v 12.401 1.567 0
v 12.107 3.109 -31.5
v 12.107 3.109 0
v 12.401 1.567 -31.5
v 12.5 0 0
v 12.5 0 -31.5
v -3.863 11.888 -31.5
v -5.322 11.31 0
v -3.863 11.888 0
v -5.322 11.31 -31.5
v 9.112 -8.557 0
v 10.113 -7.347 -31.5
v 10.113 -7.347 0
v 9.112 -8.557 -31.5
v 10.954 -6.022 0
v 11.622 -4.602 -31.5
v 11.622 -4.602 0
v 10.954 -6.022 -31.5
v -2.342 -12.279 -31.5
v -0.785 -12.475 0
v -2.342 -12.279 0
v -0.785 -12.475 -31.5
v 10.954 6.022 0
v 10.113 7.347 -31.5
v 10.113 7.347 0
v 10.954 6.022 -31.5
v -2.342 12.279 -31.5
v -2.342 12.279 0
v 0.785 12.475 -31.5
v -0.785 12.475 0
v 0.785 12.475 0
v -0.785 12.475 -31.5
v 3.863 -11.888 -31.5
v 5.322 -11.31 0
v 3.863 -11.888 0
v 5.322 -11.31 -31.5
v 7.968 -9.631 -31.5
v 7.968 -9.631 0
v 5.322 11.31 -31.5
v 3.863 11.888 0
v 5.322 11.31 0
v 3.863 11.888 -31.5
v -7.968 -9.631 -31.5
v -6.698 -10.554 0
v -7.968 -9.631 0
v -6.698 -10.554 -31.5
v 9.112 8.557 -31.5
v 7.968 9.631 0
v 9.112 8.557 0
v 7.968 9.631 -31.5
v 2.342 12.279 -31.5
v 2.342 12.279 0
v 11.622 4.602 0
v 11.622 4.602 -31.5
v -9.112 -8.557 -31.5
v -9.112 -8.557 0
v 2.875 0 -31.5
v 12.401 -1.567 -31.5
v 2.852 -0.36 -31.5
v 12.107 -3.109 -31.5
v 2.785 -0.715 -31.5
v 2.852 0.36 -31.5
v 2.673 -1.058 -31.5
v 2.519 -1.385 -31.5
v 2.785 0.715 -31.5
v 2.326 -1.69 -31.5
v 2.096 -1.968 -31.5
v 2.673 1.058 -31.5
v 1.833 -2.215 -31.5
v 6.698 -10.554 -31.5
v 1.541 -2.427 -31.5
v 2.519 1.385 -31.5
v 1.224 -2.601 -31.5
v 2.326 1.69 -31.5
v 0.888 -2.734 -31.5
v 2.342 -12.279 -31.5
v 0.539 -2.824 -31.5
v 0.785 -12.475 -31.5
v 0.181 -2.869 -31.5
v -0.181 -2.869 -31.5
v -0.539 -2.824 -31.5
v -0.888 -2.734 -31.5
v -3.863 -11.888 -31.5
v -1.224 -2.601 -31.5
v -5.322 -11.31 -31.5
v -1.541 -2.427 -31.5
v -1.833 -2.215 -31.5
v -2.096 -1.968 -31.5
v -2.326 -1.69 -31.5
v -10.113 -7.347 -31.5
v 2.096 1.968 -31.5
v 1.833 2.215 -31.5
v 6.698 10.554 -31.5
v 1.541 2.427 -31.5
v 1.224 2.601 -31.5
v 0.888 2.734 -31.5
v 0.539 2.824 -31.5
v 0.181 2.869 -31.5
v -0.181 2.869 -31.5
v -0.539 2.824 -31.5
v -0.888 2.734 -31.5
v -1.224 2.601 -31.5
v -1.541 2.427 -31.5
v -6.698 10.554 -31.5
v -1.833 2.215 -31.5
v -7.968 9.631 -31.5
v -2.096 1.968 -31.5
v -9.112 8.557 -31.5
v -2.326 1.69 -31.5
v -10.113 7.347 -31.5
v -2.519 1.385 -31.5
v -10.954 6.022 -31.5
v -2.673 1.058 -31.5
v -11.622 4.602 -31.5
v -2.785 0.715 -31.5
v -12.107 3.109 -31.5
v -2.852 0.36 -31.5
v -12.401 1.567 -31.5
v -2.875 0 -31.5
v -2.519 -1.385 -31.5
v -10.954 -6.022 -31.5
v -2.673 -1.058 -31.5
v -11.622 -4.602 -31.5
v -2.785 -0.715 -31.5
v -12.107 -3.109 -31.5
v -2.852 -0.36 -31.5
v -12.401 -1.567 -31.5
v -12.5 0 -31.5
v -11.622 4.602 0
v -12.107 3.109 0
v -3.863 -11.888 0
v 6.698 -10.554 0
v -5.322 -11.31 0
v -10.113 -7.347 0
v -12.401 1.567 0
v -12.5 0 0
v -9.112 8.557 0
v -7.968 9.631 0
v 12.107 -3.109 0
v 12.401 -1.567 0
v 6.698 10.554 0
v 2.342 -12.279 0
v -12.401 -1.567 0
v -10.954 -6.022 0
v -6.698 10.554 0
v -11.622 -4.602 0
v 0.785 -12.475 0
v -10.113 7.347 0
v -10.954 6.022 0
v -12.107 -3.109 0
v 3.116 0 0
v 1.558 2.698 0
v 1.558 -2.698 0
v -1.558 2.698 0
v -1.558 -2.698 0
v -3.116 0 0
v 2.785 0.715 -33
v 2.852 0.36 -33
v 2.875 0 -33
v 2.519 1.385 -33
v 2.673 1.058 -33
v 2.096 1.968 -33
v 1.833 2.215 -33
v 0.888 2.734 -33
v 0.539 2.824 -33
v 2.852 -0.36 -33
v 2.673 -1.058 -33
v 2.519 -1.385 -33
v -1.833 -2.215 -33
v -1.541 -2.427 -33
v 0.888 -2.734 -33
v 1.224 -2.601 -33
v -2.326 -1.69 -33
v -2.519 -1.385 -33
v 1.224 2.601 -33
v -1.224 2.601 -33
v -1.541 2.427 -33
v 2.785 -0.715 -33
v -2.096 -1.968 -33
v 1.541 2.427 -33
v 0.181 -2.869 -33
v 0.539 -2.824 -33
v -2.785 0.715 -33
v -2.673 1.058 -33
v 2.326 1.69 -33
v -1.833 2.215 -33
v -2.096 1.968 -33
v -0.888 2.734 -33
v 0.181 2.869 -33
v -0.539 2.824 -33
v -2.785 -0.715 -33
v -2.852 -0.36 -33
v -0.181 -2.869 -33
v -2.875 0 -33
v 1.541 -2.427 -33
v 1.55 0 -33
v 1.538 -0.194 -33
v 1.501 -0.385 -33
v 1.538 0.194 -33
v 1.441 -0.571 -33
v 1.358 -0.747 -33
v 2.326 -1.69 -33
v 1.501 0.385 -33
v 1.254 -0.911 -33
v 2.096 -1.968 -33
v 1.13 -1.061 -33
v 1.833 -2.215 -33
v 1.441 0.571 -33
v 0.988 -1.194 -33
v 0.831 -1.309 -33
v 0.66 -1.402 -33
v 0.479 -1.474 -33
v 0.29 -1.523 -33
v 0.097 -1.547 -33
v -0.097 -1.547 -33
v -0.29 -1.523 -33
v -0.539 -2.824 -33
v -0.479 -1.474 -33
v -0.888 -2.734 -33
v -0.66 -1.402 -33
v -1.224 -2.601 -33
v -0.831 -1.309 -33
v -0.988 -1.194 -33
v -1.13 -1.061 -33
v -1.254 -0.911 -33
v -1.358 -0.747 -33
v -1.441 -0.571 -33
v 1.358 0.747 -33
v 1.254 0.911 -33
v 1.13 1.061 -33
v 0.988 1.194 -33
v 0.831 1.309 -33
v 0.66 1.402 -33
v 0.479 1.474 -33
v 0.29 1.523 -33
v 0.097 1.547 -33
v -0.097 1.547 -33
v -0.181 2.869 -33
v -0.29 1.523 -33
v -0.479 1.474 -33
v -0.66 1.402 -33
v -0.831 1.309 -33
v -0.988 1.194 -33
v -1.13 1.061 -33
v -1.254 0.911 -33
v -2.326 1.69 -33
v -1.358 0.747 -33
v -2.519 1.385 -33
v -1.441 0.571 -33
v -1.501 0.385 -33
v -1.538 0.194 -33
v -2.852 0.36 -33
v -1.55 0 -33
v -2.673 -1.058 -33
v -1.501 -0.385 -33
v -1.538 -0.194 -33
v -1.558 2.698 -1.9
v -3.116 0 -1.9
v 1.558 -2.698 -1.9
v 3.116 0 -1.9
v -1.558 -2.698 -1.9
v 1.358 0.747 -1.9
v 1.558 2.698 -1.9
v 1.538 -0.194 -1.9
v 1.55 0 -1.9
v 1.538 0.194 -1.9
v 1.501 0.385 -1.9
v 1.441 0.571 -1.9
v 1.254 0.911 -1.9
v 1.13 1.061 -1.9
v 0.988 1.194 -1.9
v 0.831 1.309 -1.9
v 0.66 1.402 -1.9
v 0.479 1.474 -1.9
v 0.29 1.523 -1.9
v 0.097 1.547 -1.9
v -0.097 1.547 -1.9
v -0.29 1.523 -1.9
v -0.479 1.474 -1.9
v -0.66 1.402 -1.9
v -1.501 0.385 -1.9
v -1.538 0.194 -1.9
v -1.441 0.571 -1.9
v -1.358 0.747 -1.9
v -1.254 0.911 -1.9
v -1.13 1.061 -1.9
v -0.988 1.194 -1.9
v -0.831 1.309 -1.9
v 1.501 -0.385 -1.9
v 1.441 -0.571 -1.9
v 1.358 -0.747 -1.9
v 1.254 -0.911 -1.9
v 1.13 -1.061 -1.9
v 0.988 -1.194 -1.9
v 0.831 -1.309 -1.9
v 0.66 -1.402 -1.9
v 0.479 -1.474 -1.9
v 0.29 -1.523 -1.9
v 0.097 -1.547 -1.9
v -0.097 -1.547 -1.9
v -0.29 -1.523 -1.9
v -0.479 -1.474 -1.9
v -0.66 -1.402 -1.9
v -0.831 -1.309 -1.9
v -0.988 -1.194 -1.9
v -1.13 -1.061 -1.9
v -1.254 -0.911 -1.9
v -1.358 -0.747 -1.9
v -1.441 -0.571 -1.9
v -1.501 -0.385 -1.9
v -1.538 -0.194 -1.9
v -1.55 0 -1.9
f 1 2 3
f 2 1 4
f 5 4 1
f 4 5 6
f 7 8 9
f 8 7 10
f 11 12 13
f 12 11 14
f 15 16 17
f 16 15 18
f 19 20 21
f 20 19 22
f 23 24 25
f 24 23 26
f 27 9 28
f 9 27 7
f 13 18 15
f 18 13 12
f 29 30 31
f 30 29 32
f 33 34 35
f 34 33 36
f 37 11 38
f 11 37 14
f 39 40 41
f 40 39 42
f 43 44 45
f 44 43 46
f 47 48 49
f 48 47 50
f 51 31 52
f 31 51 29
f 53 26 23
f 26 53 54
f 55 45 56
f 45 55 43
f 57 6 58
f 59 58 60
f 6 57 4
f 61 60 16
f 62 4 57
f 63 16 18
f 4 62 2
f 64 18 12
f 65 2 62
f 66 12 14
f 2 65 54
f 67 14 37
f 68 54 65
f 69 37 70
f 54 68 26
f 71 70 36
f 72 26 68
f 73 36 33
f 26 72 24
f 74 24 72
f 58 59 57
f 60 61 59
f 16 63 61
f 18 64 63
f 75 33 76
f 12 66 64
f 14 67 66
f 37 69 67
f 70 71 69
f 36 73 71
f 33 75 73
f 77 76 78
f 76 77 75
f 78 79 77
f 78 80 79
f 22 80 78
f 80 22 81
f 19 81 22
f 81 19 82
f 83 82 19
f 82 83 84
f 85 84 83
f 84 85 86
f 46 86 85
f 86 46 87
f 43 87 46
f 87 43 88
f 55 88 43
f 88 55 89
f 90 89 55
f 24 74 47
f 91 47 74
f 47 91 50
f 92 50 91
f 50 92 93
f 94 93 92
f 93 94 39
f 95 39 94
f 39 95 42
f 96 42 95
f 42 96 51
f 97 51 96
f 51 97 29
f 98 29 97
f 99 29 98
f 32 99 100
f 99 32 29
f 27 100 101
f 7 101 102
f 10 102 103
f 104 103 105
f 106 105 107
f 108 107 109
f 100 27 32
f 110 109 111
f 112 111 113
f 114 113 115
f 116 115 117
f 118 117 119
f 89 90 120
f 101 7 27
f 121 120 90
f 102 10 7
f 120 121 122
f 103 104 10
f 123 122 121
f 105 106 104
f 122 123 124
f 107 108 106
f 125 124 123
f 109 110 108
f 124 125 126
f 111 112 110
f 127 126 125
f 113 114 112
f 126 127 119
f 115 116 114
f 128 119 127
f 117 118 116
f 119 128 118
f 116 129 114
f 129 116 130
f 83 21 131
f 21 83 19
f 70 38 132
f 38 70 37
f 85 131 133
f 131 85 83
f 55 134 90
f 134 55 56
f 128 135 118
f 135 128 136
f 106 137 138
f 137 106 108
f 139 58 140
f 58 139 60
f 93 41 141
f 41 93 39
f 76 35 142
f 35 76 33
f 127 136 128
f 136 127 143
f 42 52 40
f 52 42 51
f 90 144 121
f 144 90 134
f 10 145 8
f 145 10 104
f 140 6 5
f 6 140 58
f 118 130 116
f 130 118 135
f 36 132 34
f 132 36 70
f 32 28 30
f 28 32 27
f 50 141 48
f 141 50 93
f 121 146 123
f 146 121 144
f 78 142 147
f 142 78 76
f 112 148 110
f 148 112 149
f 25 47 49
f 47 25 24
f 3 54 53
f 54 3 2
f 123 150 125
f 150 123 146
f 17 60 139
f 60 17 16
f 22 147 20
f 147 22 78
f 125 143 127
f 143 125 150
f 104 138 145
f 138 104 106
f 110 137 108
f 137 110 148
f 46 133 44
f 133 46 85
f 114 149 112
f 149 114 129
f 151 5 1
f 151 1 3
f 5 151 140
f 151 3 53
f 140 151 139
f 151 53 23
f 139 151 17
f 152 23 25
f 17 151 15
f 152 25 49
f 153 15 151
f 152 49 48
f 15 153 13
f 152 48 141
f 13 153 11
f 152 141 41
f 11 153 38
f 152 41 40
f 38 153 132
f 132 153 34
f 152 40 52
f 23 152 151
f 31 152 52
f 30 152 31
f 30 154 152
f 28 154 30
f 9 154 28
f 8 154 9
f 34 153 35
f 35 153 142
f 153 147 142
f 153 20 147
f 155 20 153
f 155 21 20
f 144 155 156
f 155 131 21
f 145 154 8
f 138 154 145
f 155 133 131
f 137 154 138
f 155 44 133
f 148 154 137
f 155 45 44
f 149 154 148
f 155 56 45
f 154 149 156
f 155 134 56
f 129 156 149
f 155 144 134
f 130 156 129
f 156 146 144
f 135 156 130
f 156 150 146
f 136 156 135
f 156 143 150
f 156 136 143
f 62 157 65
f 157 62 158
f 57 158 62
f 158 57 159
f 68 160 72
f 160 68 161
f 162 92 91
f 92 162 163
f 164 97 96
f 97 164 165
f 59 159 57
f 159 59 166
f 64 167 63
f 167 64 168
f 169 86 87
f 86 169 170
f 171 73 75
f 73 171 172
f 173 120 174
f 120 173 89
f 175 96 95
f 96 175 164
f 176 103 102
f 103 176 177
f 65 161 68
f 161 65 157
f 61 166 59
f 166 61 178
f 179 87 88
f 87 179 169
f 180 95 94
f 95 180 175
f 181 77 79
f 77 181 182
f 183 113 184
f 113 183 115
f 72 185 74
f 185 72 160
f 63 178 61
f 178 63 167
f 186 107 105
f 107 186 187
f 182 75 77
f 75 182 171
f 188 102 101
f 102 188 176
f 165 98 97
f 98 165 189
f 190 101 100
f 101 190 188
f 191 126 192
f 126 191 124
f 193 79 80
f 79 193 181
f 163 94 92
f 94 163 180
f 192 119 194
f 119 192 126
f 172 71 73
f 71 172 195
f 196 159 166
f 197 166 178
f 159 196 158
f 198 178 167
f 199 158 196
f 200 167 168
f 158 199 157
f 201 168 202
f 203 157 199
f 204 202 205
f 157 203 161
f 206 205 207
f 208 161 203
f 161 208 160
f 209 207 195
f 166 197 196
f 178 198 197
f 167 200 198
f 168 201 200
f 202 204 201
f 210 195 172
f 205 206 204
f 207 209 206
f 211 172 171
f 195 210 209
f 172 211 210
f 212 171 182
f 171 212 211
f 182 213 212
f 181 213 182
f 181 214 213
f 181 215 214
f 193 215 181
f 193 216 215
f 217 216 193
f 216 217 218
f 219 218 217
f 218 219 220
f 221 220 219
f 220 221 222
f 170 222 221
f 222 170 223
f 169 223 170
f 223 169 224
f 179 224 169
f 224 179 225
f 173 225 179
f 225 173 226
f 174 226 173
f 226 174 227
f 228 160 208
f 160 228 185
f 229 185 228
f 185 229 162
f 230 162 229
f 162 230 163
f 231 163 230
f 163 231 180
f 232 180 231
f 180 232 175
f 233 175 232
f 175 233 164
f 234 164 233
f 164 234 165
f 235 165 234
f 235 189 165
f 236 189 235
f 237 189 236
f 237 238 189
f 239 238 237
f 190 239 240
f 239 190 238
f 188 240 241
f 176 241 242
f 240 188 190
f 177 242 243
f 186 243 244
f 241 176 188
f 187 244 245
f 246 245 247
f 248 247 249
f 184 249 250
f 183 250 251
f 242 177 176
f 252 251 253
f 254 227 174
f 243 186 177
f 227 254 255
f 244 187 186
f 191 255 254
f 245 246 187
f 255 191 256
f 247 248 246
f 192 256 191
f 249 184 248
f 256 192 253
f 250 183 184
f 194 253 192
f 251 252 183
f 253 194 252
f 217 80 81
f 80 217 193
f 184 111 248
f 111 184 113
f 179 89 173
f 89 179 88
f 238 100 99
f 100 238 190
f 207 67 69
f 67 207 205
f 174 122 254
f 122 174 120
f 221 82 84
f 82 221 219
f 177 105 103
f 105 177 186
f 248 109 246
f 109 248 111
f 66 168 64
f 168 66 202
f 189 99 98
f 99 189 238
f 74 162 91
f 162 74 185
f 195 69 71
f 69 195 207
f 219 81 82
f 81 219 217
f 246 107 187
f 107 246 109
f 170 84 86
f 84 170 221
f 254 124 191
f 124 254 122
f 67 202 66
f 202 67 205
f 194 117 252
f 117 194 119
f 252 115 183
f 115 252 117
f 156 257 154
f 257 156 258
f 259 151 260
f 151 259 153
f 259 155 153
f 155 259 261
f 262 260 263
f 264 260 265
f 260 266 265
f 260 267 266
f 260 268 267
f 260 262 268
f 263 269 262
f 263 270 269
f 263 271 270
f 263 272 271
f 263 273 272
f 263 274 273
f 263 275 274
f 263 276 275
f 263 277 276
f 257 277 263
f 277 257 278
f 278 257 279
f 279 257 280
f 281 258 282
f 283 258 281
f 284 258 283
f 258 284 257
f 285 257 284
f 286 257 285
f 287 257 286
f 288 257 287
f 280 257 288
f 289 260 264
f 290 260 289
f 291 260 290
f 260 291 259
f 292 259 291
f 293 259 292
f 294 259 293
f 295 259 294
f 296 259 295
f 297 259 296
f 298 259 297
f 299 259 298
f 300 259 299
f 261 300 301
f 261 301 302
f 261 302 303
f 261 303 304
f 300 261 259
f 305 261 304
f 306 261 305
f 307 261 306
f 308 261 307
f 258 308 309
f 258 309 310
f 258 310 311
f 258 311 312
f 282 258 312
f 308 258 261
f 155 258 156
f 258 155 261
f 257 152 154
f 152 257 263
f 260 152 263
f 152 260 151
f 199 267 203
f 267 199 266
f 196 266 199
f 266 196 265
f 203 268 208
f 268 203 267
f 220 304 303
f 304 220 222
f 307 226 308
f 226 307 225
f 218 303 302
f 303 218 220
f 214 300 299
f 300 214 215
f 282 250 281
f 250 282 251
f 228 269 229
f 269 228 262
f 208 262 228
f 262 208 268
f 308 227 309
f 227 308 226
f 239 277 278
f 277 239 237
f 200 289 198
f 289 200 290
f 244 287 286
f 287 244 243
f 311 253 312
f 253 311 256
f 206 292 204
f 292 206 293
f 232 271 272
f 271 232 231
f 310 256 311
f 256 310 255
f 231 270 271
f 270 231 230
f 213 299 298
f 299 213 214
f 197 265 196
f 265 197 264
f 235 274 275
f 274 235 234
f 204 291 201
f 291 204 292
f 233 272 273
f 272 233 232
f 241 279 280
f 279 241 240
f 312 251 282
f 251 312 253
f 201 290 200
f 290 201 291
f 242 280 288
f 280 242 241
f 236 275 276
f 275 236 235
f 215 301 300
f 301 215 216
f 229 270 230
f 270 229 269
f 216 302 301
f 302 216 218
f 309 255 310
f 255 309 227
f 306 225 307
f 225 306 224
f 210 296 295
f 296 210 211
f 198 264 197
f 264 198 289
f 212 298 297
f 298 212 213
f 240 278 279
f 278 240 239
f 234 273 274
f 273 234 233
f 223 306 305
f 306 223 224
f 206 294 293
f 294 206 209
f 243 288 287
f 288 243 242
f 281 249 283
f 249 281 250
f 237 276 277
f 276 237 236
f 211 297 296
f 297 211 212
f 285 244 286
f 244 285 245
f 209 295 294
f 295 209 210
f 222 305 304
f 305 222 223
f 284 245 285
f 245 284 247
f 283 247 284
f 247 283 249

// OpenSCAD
$fn = 50;

difference() {
	union() {
		translate(v = [0, 0, -31.5]) {
			cylinder(h = 31.5, r = 12.5);
		}
		#translate(v = [0, 0, -33.0]) {
			cylinder(h = 33, r = 2.875);
		}
	}
	union() {
		translate(v = [0, 0, 0]) {
			rotate(a = [0, 0, 0]) {
				difference() {
					union() {
						translate(v = [0, 0, -1.9]) {
							linear_extrude(height = 1.9) {
								polygon(points = [[3.1158, 0.0], [1.5579000000000005, 2.698361953111554], [-1.5578999999999994, 2.6983619531115544], [-3.1158, 3.815754496783323e-16], [-1.5579000000000014, -2.6983619531115535], [1.557899999999998, -2.6983619531115552]]);
							}
						}
					}
					union();
				}
			}
		}
		#translate(v = [0, 0, -100.0]) {
			cylinder(h = 200, r = 1.55);
		}
	}
}
